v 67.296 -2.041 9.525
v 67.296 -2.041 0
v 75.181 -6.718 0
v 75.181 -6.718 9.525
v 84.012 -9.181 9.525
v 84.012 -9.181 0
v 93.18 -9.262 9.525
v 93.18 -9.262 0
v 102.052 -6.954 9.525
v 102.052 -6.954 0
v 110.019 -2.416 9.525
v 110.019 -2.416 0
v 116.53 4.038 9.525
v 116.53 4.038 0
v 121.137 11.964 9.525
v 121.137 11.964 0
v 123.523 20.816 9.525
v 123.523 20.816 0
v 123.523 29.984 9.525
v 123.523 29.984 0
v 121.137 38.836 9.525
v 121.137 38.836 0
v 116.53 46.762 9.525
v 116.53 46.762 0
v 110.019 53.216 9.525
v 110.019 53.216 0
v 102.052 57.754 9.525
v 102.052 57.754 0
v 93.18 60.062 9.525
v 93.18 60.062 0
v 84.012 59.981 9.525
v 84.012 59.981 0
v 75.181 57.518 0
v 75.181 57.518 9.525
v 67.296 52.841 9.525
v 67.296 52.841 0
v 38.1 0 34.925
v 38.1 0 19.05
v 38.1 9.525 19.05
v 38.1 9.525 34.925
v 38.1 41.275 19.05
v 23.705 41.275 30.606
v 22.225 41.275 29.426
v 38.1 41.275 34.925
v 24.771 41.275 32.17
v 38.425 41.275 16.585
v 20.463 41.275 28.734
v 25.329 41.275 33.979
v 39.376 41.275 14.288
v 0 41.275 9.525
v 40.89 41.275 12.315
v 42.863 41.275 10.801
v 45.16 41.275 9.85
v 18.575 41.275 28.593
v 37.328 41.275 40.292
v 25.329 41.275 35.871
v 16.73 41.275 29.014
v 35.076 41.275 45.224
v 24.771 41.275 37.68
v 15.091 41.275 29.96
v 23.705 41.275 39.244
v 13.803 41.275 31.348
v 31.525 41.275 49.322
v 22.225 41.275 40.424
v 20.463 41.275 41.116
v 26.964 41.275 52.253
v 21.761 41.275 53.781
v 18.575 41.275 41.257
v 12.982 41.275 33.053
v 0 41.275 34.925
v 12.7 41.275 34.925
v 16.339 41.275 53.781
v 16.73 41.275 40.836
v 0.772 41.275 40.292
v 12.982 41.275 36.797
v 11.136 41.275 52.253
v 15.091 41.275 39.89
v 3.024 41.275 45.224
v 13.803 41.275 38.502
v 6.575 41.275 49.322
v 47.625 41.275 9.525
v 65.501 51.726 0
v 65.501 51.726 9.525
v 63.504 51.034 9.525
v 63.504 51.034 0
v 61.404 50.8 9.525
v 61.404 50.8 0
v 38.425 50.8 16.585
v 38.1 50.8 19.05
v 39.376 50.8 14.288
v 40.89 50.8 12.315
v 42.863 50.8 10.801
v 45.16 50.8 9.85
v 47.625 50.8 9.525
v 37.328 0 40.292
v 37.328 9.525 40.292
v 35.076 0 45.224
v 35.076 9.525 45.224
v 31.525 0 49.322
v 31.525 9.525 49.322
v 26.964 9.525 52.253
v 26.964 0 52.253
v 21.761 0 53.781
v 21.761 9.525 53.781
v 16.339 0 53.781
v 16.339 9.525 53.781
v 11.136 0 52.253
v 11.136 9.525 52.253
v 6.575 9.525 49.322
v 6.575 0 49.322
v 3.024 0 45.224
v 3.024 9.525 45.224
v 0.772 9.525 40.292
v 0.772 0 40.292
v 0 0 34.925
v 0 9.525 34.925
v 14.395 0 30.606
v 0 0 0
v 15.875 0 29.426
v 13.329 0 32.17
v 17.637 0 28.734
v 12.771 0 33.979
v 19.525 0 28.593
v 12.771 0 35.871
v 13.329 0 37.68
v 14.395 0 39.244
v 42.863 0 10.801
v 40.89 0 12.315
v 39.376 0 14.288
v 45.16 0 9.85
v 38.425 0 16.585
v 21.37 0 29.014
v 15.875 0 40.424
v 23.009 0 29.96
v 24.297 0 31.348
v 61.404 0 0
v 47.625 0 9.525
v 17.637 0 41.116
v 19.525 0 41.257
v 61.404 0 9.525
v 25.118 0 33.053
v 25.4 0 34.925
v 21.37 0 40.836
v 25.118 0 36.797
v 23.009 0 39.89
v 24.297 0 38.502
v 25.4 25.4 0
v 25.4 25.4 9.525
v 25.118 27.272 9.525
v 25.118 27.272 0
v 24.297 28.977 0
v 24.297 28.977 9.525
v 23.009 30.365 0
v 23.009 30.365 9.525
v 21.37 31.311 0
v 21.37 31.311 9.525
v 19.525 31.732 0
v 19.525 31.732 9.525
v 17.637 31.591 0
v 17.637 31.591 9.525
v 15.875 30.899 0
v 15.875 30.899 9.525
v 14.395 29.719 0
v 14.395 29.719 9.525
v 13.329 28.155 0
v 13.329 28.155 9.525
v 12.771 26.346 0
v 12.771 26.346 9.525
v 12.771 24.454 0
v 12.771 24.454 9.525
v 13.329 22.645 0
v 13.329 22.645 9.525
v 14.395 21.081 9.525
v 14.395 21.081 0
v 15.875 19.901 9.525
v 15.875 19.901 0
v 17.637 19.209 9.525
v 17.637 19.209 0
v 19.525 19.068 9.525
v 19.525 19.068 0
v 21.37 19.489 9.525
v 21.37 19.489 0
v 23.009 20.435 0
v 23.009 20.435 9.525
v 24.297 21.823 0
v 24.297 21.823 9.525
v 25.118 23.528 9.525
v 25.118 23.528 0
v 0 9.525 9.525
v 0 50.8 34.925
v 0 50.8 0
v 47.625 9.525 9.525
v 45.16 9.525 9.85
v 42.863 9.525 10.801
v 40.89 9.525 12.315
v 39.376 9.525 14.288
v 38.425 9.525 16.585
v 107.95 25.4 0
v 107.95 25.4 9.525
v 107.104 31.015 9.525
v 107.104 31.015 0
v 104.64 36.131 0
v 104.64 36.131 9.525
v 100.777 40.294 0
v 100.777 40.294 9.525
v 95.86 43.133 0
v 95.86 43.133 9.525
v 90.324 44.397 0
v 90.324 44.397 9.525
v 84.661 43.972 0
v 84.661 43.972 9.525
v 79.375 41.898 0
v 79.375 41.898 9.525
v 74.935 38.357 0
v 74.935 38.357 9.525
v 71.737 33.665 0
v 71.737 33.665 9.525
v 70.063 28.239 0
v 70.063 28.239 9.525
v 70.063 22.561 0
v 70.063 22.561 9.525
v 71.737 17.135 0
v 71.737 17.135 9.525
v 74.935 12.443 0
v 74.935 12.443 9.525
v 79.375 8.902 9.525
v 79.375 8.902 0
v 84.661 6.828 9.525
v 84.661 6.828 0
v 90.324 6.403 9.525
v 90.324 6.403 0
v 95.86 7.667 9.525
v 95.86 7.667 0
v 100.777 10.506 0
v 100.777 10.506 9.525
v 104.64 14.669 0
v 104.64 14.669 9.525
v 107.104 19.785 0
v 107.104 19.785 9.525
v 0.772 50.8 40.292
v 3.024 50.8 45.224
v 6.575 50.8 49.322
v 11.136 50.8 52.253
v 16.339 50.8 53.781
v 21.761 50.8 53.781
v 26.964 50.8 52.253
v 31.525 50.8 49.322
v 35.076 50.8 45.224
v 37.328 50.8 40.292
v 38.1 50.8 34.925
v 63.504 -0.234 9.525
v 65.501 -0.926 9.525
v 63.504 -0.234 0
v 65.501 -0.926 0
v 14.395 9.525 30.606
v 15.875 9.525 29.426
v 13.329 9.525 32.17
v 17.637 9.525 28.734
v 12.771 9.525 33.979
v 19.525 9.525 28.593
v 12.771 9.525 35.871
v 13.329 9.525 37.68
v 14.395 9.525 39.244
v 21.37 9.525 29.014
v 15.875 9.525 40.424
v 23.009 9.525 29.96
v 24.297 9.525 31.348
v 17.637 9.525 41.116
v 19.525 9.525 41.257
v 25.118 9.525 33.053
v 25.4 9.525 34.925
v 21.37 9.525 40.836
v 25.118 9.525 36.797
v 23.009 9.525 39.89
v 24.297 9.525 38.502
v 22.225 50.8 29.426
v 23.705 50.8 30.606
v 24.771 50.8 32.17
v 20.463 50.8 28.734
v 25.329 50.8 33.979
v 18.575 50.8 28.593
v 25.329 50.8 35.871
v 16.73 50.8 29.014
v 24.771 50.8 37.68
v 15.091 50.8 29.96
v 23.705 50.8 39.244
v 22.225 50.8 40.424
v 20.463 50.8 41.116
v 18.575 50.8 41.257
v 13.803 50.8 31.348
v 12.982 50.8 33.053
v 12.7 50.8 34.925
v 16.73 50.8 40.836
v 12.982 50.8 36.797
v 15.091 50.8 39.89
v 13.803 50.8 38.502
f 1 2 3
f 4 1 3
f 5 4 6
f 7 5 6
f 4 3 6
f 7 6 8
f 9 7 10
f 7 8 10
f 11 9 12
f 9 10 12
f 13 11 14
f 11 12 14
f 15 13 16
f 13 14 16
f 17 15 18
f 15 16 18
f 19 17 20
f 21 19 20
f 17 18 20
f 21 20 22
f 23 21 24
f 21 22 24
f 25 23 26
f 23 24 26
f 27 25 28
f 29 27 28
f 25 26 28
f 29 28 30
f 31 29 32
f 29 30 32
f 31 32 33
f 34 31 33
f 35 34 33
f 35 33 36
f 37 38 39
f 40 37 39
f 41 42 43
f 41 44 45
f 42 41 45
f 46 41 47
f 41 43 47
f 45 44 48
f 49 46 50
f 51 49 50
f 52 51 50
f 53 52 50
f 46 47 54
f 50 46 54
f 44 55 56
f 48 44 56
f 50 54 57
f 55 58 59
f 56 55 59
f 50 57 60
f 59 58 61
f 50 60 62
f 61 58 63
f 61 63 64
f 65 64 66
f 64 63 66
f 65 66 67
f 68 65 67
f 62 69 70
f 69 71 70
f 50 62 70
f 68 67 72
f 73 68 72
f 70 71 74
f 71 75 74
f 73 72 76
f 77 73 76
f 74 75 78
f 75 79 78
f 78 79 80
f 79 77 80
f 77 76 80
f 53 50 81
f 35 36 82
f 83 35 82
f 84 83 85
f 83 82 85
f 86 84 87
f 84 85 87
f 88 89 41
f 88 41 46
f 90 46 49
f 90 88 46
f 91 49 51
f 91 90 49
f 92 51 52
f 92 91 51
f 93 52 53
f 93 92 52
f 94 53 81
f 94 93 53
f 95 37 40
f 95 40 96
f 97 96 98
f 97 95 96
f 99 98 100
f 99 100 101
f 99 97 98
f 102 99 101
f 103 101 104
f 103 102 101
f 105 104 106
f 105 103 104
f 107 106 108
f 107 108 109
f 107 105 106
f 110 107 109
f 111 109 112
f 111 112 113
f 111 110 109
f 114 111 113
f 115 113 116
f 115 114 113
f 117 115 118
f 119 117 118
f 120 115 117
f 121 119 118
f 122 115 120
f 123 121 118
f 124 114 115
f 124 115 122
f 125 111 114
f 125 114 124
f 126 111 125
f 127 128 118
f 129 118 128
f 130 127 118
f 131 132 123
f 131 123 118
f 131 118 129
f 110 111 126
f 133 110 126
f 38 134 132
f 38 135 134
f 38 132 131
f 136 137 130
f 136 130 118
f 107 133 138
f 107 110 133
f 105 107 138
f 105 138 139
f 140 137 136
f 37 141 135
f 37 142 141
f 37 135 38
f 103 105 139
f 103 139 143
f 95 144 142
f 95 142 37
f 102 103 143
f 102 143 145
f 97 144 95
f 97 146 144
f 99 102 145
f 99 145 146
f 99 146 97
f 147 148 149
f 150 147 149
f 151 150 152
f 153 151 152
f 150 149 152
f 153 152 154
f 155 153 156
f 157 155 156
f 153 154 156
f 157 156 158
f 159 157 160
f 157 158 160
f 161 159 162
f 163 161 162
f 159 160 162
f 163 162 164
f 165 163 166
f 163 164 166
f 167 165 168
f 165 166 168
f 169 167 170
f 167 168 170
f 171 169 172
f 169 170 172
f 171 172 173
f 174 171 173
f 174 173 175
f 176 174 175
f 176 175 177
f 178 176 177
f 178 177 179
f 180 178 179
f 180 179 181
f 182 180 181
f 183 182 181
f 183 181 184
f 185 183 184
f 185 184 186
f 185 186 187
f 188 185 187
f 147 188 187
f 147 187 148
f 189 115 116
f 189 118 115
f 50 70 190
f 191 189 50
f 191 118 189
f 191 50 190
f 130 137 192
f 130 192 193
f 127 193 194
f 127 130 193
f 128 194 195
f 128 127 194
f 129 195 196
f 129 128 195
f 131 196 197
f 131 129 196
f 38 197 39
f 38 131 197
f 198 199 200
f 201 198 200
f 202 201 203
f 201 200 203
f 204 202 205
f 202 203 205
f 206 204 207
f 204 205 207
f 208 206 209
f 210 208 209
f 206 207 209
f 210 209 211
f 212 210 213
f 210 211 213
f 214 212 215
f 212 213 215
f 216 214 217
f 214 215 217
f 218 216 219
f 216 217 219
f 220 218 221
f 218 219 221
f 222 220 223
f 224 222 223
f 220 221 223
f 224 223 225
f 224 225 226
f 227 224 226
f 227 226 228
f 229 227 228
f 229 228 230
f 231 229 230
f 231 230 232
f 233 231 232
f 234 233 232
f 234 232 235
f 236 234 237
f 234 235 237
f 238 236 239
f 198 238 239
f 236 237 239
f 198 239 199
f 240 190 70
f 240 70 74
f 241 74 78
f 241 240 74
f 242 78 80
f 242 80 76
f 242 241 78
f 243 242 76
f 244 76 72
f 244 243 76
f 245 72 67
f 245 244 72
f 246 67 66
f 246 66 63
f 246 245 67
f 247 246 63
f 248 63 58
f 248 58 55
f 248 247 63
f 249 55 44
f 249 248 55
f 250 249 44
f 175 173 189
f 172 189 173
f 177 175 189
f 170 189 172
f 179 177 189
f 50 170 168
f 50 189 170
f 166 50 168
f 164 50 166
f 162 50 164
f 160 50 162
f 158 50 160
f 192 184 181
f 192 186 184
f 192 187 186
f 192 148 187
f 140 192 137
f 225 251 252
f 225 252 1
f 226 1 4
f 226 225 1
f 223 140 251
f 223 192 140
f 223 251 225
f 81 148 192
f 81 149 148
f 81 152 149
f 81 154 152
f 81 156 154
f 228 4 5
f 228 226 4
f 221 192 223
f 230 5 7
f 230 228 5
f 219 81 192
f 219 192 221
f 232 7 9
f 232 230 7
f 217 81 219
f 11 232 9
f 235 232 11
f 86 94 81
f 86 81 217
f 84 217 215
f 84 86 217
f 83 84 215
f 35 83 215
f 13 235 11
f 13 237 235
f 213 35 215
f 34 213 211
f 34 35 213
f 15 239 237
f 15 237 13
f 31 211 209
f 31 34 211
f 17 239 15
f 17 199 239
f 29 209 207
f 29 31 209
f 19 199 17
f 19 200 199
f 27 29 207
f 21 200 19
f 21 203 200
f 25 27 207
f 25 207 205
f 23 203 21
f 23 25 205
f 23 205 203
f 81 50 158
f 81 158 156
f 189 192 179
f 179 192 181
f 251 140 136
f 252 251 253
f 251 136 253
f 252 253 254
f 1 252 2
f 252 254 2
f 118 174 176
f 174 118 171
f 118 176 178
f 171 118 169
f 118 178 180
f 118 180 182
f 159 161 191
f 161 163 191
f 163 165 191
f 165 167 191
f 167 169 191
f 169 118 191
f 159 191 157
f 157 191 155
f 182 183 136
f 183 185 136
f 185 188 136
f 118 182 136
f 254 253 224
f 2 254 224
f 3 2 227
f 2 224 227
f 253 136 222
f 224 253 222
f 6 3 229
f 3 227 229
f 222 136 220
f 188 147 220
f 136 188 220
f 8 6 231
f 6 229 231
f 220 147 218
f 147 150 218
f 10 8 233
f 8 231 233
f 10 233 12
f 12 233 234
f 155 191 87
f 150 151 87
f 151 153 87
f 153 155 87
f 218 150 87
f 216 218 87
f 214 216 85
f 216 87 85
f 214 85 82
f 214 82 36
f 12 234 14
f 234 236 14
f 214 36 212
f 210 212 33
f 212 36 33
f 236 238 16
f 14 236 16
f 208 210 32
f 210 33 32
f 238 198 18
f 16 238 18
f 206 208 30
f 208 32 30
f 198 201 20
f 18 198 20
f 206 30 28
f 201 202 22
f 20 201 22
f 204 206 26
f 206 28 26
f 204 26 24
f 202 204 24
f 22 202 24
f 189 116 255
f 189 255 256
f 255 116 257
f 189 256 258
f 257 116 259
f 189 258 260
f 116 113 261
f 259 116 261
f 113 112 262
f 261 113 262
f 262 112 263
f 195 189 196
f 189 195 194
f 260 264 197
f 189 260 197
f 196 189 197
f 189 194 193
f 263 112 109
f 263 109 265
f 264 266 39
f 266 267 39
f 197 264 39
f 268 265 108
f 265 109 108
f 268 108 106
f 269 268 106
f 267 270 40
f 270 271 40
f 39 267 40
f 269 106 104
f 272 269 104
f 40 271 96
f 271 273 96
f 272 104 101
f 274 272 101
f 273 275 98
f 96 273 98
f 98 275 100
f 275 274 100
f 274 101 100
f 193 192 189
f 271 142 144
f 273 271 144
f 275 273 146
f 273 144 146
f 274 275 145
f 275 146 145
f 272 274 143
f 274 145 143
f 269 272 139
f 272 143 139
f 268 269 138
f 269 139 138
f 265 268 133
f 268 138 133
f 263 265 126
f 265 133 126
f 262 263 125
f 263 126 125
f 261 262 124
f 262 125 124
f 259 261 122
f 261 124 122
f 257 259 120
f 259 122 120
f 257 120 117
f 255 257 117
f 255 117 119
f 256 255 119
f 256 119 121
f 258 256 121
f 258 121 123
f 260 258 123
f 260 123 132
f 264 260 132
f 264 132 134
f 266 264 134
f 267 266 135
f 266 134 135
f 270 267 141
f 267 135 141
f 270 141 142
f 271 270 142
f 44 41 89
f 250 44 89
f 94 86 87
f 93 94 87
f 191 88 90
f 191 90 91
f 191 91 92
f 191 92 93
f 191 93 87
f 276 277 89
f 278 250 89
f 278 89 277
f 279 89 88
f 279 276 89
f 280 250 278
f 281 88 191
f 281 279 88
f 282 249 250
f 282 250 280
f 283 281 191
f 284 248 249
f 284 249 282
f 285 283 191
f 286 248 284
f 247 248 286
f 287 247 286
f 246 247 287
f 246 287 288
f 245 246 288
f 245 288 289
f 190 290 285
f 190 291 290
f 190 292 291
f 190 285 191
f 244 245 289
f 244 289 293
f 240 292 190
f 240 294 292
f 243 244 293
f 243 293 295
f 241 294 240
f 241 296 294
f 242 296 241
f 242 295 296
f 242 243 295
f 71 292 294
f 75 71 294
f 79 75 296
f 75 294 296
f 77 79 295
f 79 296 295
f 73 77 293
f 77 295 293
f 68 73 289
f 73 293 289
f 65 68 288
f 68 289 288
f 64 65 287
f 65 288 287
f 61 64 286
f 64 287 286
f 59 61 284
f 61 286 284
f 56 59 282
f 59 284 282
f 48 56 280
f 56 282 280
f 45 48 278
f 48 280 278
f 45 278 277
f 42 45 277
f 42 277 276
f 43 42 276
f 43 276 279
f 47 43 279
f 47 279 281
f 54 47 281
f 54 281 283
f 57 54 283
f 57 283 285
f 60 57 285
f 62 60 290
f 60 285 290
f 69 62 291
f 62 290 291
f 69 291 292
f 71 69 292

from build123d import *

# Parameters (mm, degrees)
F1_DEPTH  = 9.525
F2_R      = 19.05
F3_DEPTH  = 9.525
F4_W      = 38.1
F4_H      = 9.525
F5_DEPTH  = 25.4
F7_DEPTH  = 9.525
F8_R      = 6.35
F9_DEPTH  = 9.525
F10_R     = 19.05
F11_DEPTH = 9.525
F12_R     = 6.35
F13_DEPTH = 9.525
F14_R     = 6.35
F15_DEPTH = 25.4
F16_DEPTH = 9.525
F17_DEPTH = 9.525


with BuildPart() as f1:
    # F0 (on Top) → F1 (new body)
    with BuildSketch(Plane.XY):
        with BuildLine():
            Line((0, 50.8), (0, 0))
            Line((0, 0), (61.403693, 0))
            ThreePointArc((61.403693, 0), (64.521482, -0.524721), (67.295759, -2.041071))
            ThreePointArc((67.295759, -2.041071), (123.825, 25.4), (67.295759, 52.841071))
            ThreePointArc((67.295759, 52.841071), (64.521482, 51.324721), (61.403693, 50.8))
            Line((61.403693, 50.8), (0, 50.8))
        make_face()
    extrude(amount=F1_DEPTH)

    # F2 (on face) → F3 (cut)
    with BuildSketch(Plane.XY.offset(9.525)):
        with Locations((88.9, 25.4)):
            Circle(F2_R)
    extrude(amount=-F3_DEPTH, mode=Mode.SUBTRACT)

    # F4 (on face) → F5 (join)
    with BuildSketch(Plane.XY.offset(9.525)):
        with Locations((19.05, 4.7625)):
            Rectangle(F4_W, F4_H)
        with Locations((19.05, 46.0375)):
            Rectangle(F4_W, F4_H)
    extrude(amount=F5_DEPTH)

    # F6 (on face) → F7 (join)
    with BuildSketch(Plane(origin=(0, 50.8, 0), x_dir=(-1, 0, 0), z_dir=(0, 1, 0))):
        with BuildLine():
            ThreePointArc((-38.1, 34.925), (-19.05, 15.875), (0, 34.925))
            ThreePointArc((0, 34.925), (-19.05, 53.975), (-38.1, 34.925))
        make_face()
    extrude(amount=-F7_DEPTH)

    # F8 (on face) → F9 (cut)
    with BuildSketch(Plane(origin=(0, 50.8, 0), x_dir=(-1, 0, 0), z_dir=(0, 1, 0))):
        with Locations((-19.05, 34.925)):
            Circle(F8_R)
    extrude(amount=-F9_DEPTH, mode=Mode.SUBTRACT)

    # F10 (on face) → F11 (join)
    with BuildSketch(Plane.XZ):
        with Locations((19.05, 34.925)):
            Circle(F10_R)
    extrude(amount=-F11_DEPTH)

    # F12 (on face) → F13 (cut)
    with BuildSketch(Plane.XZ):
        with Locations((19.05, 34.925)):
            Circle(F12_R)
    extrude(amount=-F13_DEPTH, mode=Mode.SUBTRACT)

    # F14 (on face) → F15 (cut)
    with BuildSketch(Plane.XY.offset(9.525)):
        with Locations((19.05, 25.4)):
            Circle(F14_R)
    extrude(amount=-F15_DEPTH, mode=Mode.SUBTRACT)

    # F6 (on face) → F16 (join)
    with BuildSketch(Plane(origin=(0, 50.8, 0), x_dir=(-1, 0, 0), z_dir=(0, 1, 0))):
        with BuildLine():
            Line((-38.1, 9.525), (-38.1, 19.05))
            ThreePointArc((-38.1, 19.05), (-40.889808, 12.314808), (-47.625, 9.525))
            Line((-47.625, 9.525), (-38.1, 9.525))
        make_face()
    extrude(amount=-F16_DEPTH)

    # F10 (on face) → F17 (join)
    with BuildSketch(Plane.XZ):
        with BuildLine():
            ThreePointArc((47.625, 9.525), (40.889808, 12.314808), (38.1, 19.05))
            Line((38.1, 19.05), (38.1, 9.525))
            Line((38.1, 9.525), (47.625, 9.525))
        make_face()
    extrude(amount=-F17_DEPTH)


solid = f1.part
